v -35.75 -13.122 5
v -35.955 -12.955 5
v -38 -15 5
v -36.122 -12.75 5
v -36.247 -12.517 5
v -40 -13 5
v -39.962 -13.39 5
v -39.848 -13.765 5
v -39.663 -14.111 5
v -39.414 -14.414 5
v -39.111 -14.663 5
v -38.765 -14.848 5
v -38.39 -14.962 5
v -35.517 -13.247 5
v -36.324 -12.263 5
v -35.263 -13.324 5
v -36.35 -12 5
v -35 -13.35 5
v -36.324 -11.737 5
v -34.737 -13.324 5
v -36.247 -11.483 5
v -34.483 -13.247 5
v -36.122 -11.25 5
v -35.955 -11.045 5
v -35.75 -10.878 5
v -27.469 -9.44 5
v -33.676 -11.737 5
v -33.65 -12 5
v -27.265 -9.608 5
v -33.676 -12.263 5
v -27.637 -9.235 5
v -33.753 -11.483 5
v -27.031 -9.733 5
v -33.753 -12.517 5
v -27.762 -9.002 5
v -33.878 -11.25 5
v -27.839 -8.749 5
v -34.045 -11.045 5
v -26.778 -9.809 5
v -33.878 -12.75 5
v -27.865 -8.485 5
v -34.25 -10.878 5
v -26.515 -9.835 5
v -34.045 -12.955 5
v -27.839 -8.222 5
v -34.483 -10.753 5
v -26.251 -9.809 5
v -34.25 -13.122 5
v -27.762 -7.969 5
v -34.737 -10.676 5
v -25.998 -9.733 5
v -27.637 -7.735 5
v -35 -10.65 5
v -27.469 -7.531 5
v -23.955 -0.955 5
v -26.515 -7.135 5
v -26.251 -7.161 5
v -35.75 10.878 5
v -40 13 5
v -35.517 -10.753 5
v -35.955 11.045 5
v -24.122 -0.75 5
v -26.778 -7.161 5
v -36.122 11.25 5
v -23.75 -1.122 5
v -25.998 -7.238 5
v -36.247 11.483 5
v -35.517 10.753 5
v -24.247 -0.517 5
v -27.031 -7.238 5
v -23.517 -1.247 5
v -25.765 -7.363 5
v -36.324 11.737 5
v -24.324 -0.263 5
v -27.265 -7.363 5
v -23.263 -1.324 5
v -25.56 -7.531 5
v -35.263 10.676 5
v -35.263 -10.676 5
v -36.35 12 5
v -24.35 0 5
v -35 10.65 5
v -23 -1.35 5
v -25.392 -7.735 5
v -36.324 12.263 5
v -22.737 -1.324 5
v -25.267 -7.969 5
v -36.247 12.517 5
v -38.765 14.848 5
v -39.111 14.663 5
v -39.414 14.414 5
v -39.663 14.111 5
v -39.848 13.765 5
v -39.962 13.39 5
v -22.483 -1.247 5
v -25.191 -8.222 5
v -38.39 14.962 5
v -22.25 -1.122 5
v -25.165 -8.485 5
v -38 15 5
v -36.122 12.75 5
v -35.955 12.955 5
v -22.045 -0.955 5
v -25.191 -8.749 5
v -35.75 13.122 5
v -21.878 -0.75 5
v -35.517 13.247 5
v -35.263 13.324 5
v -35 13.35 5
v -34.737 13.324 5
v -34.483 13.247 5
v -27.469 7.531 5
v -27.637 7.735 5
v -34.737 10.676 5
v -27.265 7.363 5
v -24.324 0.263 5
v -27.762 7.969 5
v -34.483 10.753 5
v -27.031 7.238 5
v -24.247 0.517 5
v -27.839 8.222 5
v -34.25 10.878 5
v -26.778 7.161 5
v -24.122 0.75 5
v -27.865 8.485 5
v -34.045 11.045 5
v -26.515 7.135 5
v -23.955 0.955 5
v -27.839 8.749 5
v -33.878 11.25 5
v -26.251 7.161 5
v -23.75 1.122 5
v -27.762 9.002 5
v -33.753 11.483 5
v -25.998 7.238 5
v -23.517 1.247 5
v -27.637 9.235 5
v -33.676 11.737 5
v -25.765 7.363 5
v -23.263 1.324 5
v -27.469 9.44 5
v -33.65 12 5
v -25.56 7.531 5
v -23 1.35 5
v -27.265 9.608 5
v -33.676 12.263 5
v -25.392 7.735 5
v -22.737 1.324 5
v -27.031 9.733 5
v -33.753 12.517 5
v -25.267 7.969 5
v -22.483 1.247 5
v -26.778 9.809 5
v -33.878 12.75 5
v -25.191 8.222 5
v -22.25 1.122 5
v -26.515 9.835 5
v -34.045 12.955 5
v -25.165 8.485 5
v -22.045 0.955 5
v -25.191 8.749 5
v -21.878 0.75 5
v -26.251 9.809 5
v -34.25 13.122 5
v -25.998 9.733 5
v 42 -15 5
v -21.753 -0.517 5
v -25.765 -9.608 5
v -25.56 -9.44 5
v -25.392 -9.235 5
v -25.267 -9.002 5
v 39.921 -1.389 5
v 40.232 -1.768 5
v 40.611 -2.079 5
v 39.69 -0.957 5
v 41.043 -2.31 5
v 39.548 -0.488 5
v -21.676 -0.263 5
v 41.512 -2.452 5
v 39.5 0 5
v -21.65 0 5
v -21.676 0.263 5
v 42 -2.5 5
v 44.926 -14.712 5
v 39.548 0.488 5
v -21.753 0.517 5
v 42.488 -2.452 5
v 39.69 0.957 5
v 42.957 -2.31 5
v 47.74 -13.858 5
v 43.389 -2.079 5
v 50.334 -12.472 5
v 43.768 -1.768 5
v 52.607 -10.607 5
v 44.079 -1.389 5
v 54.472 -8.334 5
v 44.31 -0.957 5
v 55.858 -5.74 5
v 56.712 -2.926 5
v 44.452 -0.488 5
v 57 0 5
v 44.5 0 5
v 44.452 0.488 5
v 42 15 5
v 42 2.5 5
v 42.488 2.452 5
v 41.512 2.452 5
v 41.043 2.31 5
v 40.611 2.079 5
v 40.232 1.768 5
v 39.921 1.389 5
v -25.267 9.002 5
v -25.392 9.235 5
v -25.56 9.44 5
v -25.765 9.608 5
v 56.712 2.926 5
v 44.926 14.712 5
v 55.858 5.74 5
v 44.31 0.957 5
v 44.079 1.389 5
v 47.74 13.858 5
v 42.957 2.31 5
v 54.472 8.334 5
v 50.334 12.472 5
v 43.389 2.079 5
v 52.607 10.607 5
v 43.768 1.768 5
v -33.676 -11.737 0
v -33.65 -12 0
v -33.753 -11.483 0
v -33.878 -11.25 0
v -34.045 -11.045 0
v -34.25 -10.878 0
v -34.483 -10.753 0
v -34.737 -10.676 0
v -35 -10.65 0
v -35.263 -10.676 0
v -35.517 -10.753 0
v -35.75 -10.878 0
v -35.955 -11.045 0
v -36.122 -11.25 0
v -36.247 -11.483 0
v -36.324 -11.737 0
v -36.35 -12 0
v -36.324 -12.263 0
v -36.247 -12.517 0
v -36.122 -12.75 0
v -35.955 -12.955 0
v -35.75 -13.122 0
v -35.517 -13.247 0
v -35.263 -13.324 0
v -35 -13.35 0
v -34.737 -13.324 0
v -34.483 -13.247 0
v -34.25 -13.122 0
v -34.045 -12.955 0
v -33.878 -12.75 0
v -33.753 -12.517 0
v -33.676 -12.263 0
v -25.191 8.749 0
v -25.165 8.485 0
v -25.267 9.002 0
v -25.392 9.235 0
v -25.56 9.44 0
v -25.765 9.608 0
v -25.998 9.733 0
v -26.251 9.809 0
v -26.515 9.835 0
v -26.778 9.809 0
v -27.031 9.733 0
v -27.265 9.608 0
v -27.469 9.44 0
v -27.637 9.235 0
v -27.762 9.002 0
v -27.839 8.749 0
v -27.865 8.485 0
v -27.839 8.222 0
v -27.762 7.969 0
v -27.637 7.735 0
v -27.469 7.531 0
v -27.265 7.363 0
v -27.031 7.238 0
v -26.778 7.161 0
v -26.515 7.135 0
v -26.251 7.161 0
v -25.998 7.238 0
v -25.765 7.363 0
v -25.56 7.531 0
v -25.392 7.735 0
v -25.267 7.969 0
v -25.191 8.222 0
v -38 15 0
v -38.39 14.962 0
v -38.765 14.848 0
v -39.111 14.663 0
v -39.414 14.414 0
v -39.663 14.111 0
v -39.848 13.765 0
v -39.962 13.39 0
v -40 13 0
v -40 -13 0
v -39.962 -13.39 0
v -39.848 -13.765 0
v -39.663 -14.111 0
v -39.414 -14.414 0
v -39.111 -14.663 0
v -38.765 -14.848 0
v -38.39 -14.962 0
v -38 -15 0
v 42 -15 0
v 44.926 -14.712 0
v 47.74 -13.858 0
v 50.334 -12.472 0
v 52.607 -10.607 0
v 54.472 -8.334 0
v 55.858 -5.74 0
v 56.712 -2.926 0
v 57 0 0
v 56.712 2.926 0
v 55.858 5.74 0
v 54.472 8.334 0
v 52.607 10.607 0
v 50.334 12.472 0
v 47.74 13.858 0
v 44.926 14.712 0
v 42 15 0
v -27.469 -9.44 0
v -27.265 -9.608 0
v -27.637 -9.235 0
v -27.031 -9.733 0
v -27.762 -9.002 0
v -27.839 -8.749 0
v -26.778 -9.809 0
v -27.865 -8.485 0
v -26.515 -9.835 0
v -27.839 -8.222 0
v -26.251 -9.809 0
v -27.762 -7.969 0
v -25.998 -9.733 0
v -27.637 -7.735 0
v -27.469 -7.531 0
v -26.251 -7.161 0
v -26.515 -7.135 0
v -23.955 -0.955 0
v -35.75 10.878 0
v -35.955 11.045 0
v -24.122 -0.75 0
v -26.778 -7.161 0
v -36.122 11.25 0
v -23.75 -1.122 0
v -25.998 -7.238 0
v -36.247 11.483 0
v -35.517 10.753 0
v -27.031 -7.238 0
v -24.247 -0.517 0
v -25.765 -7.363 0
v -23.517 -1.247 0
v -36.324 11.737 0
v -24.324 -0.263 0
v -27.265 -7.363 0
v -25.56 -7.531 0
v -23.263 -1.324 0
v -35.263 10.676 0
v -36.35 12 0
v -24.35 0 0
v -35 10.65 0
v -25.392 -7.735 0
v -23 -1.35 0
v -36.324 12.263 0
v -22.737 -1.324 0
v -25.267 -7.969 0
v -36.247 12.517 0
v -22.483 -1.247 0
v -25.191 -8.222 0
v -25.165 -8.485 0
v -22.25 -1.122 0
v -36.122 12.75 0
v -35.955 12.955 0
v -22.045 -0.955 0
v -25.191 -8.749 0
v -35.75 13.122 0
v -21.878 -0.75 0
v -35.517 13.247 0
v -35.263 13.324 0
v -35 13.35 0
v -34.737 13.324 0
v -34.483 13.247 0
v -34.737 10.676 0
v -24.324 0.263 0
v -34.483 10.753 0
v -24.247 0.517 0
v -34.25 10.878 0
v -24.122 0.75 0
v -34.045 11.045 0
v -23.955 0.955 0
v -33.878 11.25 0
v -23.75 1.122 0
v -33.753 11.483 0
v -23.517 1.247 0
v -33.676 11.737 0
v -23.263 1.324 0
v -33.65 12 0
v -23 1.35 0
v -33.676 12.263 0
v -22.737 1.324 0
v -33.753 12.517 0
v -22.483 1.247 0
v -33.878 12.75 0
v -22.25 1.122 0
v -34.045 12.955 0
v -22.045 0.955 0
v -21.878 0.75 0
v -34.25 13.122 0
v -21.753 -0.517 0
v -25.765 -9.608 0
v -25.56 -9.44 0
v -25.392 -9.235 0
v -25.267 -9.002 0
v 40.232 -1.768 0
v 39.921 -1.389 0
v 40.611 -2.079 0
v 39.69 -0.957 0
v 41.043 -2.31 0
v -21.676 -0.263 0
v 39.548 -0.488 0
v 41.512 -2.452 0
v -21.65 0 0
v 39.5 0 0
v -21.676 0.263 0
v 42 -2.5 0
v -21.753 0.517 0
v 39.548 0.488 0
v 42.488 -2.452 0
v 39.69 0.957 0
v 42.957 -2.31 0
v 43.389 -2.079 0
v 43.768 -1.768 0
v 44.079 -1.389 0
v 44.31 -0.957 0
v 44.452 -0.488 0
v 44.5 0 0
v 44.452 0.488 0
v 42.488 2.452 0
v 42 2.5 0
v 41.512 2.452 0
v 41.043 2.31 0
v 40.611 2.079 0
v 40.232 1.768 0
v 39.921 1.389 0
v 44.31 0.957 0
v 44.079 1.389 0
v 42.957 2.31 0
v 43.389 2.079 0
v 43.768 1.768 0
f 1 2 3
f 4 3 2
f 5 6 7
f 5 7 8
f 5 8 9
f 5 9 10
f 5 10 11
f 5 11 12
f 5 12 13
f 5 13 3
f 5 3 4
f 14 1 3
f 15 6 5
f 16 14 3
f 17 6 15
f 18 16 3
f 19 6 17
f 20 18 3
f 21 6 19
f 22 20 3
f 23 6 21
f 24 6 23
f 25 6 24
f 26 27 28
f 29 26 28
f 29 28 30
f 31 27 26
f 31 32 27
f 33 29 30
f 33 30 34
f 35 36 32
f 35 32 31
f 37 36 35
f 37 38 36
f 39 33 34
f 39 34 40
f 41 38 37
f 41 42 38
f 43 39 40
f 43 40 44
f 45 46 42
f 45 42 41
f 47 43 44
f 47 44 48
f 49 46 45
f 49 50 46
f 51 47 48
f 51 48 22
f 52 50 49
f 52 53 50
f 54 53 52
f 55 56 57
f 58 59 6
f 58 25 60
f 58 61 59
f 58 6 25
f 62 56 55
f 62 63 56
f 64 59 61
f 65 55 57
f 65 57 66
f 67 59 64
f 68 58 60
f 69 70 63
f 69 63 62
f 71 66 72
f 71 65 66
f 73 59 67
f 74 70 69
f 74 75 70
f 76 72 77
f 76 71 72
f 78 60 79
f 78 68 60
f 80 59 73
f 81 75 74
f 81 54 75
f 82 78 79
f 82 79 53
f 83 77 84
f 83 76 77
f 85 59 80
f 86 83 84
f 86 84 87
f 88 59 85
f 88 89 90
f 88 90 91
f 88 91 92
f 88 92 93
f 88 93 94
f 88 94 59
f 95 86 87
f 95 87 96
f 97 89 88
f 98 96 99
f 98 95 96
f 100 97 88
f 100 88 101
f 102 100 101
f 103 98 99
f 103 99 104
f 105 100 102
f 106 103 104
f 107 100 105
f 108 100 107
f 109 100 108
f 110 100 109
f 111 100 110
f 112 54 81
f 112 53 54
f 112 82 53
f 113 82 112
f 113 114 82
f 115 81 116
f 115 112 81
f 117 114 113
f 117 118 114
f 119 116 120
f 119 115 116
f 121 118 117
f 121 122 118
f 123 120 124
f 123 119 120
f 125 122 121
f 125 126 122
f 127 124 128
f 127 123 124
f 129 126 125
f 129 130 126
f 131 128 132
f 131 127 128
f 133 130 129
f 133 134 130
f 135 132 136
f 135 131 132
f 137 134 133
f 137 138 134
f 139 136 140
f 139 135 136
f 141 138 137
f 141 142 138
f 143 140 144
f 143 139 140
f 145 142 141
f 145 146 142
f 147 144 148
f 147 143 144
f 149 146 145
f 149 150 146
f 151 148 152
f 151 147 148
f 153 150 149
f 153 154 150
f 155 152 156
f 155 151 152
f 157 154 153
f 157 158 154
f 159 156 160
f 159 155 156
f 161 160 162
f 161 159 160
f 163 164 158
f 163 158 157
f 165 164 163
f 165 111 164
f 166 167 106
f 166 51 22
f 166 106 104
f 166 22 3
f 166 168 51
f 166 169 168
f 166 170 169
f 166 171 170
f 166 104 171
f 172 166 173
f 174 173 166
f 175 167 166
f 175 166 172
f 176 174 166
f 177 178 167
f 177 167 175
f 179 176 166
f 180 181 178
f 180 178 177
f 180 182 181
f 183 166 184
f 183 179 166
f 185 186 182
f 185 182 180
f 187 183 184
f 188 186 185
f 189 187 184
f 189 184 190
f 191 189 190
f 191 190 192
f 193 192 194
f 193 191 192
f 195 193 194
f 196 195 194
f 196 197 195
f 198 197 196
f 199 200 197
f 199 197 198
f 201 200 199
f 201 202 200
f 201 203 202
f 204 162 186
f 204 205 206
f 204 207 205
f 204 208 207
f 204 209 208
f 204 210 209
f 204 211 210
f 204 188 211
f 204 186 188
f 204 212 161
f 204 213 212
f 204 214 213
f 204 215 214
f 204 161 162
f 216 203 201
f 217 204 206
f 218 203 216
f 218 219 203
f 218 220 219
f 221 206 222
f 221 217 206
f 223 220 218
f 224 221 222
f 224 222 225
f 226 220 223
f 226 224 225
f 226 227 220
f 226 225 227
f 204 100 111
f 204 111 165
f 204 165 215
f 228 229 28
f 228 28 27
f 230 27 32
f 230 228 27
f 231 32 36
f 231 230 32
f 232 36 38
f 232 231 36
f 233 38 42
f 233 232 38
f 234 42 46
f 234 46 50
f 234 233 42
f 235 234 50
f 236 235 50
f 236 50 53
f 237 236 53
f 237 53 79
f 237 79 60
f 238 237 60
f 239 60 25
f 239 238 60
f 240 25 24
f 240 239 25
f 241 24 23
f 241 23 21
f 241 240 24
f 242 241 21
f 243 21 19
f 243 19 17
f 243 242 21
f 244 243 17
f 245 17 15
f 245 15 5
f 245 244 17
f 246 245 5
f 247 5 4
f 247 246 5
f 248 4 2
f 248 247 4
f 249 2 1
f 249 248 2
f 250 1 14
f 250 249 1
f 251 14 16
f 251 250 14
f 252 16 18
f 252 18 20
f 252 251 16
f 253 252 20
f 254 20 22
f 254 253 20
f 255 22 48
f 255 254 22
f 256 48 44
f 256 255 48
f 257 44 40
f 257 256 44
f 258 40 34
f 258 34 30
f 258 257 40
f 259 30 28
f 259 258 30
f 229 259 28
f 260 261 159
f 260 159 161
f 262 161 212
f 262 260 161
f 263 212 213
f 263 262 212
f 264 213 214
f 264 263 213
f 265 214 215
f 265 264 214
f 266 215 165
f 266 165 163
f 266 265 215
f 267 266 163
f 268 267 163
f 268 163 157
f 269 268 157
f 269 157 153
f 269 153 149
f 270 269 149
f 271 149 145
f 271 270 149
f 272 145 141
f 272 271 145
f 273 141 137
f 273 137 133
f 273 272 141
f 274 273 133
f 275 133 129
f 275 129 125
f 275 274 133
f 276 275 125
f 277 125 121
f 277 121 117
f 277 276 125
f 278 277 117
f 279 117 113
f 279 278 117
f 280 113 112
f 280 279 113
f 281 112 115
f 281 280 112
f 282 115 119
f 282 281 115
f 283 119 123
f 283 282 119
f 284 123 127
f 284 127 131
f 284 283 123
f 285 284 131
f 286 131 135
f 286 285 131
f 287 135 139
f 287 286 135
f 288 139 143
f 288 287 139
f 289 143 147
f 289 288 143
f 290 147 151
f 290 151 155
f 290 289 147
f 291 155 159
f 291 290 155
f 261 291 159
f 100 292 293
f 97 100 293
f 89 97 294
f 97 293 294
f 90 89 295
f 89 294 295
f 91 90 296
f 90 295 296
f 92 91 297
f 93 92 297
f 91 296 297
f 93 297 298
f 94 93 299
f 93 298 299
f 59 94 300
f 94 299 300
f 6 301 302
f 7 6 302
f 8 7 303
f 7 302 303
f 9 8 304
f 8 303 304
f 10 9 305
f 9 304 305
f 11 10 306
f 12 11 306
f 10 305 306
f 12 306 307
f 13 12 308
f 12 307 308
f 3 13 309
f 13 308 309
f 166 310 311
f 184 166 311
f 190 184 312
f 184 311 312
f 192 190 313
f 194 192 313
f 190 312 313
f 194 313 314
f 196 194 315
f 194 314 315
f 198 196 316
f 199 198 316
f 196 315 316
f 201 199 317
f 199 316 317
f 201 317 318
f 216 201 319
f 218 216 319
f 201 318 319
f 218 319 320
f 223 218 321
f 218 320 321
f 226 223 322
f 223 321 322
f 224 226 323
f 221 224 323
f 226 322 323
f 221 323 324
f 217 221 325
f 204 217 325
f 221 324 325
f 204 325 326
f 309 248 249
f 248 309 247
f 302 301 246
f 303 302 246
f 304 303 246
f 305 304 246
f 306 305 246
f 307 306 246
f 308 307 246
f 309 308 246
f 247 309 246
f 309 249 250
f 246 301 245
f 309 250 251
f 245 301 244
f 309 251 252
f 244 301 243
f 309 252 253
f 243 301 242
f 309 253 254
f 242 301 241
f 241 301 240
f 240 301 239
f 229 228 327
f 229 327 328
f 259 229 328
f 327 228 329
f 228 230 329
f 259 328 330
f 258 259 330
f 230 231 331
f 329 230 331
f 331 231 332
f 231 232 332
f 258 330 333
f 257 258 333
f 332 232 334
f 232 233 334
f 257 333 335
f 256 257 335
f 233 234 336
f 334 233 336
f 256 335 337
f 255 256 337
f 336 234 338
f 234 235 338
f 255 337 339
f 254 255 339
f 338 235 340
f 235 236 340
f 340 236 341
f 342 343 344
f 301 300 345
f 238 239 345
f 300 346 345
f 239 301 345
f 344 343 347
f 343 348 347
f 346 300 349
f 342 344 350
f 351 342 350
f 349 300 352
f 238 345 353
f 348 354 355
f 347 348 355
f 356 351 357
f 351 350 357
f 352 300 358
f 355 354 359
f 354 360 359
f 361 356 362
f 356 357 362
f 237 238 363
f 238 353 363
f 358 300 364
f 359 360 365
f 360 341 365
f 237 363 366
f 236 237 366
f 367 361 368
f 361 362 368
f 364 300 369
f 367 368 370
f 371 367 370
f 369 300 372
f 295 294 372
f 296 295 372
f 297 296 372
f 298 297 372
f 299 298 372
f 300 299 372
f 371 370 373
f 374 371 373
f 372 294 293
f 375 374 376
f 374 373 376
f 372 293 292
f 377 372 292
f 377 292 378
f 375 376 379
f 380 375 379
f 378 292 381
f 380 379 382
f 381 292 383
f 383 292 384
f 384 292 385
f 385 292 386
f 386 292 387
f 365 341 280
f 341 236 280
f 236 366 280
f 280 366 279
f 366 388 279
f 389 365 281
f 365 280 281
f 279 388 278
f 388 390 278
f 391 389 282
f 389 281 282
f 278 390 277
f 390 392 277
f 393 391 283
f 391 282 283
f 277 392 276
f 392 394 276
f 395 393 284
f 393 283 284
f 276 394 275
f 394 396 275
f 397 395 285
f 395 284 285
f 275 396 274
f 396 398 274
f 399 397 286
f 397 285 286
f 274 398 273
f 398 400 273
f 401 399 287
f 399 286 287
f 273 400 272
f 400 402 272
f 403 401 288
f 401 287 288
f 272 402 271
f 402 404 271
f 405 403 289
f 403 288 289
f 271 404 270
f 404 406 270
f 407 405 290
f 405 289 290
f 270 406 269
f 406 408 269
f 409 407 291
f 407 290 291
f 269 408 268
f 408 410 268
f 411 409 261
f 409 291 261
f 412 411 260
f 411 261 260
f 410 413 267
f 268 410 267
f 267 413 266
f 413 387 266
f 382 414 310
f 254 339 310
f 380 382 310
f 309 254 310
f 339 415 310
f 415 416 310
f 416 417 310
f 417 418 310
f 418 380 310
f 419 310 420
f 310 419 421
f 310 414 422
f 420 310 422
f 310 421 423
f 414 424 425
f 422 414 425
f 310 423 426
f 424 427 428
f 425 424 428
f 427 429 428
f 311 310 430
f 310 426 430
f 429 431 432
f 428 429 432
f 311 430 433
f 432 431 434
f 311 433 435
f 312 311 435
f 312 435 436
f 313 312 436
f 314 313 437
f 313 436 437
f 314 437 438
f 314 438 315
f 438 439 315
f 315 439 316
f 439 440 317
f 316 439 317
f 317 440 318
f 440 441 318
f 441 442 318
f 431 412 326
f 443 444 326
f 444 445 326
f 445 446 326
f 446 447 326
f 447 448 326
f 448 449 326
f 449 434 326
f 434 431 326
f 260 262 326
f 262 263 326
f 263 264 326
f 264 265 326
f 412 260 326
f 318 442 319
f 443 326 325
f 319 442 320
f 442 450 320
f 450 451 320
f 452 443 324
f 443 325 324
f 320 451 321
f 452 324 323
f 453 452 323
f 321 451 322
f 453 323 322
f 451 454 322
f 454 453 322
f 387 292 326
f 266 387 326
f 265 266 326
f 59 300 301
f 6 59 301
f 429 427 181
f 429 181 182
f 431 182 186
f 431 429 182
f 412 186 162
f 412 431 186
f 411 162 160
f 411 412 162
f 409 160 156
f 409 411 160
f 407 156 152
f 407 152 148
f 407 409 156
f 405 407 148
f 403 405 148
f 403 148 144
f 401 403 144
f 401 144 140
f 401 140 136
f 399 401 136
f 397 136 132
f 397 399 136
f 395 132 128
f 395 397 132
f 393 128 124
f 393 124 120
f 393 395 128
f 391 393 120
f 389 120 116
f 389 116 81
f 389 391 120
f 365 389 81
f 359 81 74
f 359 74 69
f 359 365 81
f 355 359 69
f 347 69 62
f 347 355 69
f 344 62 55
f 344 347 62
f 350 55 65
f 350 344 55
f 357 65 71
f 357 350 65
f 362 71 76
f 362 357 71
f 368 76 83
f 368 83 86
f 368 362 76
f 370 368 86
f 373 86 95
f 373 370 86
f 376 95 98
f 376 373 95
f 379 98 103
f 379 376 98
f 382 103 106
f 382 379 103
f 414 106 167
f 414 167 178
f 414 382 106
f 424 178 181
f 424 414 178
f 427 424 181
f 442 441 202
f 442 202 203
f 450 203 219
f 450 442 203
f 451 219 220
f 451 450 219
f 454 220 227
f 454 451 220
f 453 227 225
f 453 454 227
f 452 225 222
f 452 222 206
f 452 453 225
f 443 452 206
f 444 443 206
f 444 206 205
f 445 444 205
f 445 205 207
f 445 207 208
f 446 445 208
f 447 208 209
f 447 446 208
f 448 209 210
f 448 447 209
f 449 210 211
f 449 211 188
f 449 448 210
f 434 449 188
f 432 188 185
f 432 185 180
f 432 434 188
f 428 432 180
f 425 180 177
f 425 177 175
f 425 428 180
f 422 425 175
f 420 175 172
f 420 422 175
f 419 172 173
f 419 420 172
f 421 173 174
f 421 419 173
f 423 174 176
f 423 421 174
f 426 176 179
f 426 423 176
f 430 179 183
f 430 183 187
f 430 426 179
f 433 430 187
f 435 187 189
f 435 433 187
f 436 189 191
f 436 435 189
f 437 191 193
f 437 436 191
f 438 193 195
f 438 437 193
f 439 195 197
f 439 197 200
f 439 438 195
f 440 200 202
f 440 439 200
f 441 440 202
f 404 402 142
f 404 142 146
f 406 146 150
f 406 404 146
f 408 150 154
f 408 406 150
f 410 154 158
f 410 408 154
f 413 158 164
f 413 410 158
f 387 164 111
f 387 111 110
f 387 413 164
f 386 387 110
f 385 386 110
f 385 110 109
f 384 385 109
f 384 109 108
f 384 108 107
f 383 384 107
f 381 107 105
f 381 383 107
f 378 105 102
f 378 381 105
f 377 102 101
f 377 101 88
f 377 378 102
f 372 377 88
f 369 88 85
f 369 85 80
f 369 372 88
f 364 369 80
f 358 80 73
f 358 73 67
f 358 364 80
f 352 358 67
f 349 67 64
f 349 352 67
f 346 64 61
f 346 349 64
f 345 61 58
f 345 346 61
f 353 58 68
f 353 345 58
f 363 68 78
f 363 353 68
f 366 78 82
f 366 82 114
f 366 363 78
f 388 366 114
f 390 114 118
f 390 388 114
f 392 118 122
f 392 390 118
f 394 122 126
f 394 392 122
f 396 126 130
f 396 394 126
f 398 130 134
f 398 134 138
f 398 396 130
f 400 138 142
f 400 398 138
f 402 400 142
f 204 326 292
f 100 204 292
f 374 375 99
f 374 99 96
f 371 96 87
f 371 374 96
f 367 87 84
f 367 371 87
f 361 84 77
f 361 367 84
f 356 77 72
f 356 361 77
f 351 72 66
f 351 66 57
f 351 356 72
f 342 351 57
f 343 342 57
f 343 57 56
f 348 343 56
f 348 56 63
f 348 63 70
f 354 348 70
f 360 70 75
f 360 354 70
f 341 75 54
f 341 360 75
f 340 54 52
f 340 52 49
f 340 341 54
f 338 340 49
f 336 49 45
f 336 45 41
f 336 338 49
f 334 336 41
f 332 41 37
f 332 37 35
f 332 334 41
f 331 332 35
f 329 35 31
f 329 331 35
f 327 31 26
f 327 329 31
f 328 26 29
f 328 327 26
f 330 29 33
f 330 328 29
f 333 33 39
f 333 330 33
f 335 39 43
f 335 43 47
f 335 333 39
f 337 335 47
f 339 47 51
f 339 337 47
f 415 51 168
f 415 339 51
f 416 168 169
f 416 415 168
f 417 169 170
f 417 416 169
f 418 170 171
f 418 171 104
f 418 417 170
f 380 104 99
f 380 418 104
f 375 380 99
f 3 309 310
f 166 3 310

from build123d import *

# Parameters (mm, degrees)
SKETCH_1_R      = 1.35
SKETCH_1_R_2    = 2.5
EXTRUDE_1_DEPTH = 5


with BuildPart() as part:
    # 草图1 → 凸台-拉伸1 (new body)
    with BuildSketch(Plane.XY):
        with BuildLine():
            Line((-40, 13), (-40, -13))
            ThreePointArc((-40, -13), (-39.414213562, -14.414213562), (-38, -15))
            Line((-38, -15), (42, -15))
            ThreePointArc((42, -15), (57, 0), (42, 15))
            Line((42, 15), (-38, 15))
            ThreePointArc((-38, 15), (-39.414213562, 14.414213562), (-40, 13))
        make_face()
        with Locations((-35, -12)):
            Circle(SKETCH_1_R, mode=Mode.SUBTRACT)
        with Locations((-26.514718626, -8.485281374)):
            Circle(SKETCH_1_R, mode=Mode.SUBTRACT)
        with Locations((-35, 12)):
            Circle(SKETCH_1_R, mode=Mode.SUBTRACT)
        with Locations((-26.514718626, 8.485281374)):
            Circle(SKETCH_1_R, mode=Mode.SUBTRACT)
        with Locations((-23, 0)):
            Circle(SKETCH_1_R, mode=Mode.SUBTRACT)
        with Locations((42, 0)):
            Circle(SKETCH_1_R_2, mode=Mode.SUBTRACT)
    extrude(amount=EXTRUDE_1_DEPTH)


solid = part.part
